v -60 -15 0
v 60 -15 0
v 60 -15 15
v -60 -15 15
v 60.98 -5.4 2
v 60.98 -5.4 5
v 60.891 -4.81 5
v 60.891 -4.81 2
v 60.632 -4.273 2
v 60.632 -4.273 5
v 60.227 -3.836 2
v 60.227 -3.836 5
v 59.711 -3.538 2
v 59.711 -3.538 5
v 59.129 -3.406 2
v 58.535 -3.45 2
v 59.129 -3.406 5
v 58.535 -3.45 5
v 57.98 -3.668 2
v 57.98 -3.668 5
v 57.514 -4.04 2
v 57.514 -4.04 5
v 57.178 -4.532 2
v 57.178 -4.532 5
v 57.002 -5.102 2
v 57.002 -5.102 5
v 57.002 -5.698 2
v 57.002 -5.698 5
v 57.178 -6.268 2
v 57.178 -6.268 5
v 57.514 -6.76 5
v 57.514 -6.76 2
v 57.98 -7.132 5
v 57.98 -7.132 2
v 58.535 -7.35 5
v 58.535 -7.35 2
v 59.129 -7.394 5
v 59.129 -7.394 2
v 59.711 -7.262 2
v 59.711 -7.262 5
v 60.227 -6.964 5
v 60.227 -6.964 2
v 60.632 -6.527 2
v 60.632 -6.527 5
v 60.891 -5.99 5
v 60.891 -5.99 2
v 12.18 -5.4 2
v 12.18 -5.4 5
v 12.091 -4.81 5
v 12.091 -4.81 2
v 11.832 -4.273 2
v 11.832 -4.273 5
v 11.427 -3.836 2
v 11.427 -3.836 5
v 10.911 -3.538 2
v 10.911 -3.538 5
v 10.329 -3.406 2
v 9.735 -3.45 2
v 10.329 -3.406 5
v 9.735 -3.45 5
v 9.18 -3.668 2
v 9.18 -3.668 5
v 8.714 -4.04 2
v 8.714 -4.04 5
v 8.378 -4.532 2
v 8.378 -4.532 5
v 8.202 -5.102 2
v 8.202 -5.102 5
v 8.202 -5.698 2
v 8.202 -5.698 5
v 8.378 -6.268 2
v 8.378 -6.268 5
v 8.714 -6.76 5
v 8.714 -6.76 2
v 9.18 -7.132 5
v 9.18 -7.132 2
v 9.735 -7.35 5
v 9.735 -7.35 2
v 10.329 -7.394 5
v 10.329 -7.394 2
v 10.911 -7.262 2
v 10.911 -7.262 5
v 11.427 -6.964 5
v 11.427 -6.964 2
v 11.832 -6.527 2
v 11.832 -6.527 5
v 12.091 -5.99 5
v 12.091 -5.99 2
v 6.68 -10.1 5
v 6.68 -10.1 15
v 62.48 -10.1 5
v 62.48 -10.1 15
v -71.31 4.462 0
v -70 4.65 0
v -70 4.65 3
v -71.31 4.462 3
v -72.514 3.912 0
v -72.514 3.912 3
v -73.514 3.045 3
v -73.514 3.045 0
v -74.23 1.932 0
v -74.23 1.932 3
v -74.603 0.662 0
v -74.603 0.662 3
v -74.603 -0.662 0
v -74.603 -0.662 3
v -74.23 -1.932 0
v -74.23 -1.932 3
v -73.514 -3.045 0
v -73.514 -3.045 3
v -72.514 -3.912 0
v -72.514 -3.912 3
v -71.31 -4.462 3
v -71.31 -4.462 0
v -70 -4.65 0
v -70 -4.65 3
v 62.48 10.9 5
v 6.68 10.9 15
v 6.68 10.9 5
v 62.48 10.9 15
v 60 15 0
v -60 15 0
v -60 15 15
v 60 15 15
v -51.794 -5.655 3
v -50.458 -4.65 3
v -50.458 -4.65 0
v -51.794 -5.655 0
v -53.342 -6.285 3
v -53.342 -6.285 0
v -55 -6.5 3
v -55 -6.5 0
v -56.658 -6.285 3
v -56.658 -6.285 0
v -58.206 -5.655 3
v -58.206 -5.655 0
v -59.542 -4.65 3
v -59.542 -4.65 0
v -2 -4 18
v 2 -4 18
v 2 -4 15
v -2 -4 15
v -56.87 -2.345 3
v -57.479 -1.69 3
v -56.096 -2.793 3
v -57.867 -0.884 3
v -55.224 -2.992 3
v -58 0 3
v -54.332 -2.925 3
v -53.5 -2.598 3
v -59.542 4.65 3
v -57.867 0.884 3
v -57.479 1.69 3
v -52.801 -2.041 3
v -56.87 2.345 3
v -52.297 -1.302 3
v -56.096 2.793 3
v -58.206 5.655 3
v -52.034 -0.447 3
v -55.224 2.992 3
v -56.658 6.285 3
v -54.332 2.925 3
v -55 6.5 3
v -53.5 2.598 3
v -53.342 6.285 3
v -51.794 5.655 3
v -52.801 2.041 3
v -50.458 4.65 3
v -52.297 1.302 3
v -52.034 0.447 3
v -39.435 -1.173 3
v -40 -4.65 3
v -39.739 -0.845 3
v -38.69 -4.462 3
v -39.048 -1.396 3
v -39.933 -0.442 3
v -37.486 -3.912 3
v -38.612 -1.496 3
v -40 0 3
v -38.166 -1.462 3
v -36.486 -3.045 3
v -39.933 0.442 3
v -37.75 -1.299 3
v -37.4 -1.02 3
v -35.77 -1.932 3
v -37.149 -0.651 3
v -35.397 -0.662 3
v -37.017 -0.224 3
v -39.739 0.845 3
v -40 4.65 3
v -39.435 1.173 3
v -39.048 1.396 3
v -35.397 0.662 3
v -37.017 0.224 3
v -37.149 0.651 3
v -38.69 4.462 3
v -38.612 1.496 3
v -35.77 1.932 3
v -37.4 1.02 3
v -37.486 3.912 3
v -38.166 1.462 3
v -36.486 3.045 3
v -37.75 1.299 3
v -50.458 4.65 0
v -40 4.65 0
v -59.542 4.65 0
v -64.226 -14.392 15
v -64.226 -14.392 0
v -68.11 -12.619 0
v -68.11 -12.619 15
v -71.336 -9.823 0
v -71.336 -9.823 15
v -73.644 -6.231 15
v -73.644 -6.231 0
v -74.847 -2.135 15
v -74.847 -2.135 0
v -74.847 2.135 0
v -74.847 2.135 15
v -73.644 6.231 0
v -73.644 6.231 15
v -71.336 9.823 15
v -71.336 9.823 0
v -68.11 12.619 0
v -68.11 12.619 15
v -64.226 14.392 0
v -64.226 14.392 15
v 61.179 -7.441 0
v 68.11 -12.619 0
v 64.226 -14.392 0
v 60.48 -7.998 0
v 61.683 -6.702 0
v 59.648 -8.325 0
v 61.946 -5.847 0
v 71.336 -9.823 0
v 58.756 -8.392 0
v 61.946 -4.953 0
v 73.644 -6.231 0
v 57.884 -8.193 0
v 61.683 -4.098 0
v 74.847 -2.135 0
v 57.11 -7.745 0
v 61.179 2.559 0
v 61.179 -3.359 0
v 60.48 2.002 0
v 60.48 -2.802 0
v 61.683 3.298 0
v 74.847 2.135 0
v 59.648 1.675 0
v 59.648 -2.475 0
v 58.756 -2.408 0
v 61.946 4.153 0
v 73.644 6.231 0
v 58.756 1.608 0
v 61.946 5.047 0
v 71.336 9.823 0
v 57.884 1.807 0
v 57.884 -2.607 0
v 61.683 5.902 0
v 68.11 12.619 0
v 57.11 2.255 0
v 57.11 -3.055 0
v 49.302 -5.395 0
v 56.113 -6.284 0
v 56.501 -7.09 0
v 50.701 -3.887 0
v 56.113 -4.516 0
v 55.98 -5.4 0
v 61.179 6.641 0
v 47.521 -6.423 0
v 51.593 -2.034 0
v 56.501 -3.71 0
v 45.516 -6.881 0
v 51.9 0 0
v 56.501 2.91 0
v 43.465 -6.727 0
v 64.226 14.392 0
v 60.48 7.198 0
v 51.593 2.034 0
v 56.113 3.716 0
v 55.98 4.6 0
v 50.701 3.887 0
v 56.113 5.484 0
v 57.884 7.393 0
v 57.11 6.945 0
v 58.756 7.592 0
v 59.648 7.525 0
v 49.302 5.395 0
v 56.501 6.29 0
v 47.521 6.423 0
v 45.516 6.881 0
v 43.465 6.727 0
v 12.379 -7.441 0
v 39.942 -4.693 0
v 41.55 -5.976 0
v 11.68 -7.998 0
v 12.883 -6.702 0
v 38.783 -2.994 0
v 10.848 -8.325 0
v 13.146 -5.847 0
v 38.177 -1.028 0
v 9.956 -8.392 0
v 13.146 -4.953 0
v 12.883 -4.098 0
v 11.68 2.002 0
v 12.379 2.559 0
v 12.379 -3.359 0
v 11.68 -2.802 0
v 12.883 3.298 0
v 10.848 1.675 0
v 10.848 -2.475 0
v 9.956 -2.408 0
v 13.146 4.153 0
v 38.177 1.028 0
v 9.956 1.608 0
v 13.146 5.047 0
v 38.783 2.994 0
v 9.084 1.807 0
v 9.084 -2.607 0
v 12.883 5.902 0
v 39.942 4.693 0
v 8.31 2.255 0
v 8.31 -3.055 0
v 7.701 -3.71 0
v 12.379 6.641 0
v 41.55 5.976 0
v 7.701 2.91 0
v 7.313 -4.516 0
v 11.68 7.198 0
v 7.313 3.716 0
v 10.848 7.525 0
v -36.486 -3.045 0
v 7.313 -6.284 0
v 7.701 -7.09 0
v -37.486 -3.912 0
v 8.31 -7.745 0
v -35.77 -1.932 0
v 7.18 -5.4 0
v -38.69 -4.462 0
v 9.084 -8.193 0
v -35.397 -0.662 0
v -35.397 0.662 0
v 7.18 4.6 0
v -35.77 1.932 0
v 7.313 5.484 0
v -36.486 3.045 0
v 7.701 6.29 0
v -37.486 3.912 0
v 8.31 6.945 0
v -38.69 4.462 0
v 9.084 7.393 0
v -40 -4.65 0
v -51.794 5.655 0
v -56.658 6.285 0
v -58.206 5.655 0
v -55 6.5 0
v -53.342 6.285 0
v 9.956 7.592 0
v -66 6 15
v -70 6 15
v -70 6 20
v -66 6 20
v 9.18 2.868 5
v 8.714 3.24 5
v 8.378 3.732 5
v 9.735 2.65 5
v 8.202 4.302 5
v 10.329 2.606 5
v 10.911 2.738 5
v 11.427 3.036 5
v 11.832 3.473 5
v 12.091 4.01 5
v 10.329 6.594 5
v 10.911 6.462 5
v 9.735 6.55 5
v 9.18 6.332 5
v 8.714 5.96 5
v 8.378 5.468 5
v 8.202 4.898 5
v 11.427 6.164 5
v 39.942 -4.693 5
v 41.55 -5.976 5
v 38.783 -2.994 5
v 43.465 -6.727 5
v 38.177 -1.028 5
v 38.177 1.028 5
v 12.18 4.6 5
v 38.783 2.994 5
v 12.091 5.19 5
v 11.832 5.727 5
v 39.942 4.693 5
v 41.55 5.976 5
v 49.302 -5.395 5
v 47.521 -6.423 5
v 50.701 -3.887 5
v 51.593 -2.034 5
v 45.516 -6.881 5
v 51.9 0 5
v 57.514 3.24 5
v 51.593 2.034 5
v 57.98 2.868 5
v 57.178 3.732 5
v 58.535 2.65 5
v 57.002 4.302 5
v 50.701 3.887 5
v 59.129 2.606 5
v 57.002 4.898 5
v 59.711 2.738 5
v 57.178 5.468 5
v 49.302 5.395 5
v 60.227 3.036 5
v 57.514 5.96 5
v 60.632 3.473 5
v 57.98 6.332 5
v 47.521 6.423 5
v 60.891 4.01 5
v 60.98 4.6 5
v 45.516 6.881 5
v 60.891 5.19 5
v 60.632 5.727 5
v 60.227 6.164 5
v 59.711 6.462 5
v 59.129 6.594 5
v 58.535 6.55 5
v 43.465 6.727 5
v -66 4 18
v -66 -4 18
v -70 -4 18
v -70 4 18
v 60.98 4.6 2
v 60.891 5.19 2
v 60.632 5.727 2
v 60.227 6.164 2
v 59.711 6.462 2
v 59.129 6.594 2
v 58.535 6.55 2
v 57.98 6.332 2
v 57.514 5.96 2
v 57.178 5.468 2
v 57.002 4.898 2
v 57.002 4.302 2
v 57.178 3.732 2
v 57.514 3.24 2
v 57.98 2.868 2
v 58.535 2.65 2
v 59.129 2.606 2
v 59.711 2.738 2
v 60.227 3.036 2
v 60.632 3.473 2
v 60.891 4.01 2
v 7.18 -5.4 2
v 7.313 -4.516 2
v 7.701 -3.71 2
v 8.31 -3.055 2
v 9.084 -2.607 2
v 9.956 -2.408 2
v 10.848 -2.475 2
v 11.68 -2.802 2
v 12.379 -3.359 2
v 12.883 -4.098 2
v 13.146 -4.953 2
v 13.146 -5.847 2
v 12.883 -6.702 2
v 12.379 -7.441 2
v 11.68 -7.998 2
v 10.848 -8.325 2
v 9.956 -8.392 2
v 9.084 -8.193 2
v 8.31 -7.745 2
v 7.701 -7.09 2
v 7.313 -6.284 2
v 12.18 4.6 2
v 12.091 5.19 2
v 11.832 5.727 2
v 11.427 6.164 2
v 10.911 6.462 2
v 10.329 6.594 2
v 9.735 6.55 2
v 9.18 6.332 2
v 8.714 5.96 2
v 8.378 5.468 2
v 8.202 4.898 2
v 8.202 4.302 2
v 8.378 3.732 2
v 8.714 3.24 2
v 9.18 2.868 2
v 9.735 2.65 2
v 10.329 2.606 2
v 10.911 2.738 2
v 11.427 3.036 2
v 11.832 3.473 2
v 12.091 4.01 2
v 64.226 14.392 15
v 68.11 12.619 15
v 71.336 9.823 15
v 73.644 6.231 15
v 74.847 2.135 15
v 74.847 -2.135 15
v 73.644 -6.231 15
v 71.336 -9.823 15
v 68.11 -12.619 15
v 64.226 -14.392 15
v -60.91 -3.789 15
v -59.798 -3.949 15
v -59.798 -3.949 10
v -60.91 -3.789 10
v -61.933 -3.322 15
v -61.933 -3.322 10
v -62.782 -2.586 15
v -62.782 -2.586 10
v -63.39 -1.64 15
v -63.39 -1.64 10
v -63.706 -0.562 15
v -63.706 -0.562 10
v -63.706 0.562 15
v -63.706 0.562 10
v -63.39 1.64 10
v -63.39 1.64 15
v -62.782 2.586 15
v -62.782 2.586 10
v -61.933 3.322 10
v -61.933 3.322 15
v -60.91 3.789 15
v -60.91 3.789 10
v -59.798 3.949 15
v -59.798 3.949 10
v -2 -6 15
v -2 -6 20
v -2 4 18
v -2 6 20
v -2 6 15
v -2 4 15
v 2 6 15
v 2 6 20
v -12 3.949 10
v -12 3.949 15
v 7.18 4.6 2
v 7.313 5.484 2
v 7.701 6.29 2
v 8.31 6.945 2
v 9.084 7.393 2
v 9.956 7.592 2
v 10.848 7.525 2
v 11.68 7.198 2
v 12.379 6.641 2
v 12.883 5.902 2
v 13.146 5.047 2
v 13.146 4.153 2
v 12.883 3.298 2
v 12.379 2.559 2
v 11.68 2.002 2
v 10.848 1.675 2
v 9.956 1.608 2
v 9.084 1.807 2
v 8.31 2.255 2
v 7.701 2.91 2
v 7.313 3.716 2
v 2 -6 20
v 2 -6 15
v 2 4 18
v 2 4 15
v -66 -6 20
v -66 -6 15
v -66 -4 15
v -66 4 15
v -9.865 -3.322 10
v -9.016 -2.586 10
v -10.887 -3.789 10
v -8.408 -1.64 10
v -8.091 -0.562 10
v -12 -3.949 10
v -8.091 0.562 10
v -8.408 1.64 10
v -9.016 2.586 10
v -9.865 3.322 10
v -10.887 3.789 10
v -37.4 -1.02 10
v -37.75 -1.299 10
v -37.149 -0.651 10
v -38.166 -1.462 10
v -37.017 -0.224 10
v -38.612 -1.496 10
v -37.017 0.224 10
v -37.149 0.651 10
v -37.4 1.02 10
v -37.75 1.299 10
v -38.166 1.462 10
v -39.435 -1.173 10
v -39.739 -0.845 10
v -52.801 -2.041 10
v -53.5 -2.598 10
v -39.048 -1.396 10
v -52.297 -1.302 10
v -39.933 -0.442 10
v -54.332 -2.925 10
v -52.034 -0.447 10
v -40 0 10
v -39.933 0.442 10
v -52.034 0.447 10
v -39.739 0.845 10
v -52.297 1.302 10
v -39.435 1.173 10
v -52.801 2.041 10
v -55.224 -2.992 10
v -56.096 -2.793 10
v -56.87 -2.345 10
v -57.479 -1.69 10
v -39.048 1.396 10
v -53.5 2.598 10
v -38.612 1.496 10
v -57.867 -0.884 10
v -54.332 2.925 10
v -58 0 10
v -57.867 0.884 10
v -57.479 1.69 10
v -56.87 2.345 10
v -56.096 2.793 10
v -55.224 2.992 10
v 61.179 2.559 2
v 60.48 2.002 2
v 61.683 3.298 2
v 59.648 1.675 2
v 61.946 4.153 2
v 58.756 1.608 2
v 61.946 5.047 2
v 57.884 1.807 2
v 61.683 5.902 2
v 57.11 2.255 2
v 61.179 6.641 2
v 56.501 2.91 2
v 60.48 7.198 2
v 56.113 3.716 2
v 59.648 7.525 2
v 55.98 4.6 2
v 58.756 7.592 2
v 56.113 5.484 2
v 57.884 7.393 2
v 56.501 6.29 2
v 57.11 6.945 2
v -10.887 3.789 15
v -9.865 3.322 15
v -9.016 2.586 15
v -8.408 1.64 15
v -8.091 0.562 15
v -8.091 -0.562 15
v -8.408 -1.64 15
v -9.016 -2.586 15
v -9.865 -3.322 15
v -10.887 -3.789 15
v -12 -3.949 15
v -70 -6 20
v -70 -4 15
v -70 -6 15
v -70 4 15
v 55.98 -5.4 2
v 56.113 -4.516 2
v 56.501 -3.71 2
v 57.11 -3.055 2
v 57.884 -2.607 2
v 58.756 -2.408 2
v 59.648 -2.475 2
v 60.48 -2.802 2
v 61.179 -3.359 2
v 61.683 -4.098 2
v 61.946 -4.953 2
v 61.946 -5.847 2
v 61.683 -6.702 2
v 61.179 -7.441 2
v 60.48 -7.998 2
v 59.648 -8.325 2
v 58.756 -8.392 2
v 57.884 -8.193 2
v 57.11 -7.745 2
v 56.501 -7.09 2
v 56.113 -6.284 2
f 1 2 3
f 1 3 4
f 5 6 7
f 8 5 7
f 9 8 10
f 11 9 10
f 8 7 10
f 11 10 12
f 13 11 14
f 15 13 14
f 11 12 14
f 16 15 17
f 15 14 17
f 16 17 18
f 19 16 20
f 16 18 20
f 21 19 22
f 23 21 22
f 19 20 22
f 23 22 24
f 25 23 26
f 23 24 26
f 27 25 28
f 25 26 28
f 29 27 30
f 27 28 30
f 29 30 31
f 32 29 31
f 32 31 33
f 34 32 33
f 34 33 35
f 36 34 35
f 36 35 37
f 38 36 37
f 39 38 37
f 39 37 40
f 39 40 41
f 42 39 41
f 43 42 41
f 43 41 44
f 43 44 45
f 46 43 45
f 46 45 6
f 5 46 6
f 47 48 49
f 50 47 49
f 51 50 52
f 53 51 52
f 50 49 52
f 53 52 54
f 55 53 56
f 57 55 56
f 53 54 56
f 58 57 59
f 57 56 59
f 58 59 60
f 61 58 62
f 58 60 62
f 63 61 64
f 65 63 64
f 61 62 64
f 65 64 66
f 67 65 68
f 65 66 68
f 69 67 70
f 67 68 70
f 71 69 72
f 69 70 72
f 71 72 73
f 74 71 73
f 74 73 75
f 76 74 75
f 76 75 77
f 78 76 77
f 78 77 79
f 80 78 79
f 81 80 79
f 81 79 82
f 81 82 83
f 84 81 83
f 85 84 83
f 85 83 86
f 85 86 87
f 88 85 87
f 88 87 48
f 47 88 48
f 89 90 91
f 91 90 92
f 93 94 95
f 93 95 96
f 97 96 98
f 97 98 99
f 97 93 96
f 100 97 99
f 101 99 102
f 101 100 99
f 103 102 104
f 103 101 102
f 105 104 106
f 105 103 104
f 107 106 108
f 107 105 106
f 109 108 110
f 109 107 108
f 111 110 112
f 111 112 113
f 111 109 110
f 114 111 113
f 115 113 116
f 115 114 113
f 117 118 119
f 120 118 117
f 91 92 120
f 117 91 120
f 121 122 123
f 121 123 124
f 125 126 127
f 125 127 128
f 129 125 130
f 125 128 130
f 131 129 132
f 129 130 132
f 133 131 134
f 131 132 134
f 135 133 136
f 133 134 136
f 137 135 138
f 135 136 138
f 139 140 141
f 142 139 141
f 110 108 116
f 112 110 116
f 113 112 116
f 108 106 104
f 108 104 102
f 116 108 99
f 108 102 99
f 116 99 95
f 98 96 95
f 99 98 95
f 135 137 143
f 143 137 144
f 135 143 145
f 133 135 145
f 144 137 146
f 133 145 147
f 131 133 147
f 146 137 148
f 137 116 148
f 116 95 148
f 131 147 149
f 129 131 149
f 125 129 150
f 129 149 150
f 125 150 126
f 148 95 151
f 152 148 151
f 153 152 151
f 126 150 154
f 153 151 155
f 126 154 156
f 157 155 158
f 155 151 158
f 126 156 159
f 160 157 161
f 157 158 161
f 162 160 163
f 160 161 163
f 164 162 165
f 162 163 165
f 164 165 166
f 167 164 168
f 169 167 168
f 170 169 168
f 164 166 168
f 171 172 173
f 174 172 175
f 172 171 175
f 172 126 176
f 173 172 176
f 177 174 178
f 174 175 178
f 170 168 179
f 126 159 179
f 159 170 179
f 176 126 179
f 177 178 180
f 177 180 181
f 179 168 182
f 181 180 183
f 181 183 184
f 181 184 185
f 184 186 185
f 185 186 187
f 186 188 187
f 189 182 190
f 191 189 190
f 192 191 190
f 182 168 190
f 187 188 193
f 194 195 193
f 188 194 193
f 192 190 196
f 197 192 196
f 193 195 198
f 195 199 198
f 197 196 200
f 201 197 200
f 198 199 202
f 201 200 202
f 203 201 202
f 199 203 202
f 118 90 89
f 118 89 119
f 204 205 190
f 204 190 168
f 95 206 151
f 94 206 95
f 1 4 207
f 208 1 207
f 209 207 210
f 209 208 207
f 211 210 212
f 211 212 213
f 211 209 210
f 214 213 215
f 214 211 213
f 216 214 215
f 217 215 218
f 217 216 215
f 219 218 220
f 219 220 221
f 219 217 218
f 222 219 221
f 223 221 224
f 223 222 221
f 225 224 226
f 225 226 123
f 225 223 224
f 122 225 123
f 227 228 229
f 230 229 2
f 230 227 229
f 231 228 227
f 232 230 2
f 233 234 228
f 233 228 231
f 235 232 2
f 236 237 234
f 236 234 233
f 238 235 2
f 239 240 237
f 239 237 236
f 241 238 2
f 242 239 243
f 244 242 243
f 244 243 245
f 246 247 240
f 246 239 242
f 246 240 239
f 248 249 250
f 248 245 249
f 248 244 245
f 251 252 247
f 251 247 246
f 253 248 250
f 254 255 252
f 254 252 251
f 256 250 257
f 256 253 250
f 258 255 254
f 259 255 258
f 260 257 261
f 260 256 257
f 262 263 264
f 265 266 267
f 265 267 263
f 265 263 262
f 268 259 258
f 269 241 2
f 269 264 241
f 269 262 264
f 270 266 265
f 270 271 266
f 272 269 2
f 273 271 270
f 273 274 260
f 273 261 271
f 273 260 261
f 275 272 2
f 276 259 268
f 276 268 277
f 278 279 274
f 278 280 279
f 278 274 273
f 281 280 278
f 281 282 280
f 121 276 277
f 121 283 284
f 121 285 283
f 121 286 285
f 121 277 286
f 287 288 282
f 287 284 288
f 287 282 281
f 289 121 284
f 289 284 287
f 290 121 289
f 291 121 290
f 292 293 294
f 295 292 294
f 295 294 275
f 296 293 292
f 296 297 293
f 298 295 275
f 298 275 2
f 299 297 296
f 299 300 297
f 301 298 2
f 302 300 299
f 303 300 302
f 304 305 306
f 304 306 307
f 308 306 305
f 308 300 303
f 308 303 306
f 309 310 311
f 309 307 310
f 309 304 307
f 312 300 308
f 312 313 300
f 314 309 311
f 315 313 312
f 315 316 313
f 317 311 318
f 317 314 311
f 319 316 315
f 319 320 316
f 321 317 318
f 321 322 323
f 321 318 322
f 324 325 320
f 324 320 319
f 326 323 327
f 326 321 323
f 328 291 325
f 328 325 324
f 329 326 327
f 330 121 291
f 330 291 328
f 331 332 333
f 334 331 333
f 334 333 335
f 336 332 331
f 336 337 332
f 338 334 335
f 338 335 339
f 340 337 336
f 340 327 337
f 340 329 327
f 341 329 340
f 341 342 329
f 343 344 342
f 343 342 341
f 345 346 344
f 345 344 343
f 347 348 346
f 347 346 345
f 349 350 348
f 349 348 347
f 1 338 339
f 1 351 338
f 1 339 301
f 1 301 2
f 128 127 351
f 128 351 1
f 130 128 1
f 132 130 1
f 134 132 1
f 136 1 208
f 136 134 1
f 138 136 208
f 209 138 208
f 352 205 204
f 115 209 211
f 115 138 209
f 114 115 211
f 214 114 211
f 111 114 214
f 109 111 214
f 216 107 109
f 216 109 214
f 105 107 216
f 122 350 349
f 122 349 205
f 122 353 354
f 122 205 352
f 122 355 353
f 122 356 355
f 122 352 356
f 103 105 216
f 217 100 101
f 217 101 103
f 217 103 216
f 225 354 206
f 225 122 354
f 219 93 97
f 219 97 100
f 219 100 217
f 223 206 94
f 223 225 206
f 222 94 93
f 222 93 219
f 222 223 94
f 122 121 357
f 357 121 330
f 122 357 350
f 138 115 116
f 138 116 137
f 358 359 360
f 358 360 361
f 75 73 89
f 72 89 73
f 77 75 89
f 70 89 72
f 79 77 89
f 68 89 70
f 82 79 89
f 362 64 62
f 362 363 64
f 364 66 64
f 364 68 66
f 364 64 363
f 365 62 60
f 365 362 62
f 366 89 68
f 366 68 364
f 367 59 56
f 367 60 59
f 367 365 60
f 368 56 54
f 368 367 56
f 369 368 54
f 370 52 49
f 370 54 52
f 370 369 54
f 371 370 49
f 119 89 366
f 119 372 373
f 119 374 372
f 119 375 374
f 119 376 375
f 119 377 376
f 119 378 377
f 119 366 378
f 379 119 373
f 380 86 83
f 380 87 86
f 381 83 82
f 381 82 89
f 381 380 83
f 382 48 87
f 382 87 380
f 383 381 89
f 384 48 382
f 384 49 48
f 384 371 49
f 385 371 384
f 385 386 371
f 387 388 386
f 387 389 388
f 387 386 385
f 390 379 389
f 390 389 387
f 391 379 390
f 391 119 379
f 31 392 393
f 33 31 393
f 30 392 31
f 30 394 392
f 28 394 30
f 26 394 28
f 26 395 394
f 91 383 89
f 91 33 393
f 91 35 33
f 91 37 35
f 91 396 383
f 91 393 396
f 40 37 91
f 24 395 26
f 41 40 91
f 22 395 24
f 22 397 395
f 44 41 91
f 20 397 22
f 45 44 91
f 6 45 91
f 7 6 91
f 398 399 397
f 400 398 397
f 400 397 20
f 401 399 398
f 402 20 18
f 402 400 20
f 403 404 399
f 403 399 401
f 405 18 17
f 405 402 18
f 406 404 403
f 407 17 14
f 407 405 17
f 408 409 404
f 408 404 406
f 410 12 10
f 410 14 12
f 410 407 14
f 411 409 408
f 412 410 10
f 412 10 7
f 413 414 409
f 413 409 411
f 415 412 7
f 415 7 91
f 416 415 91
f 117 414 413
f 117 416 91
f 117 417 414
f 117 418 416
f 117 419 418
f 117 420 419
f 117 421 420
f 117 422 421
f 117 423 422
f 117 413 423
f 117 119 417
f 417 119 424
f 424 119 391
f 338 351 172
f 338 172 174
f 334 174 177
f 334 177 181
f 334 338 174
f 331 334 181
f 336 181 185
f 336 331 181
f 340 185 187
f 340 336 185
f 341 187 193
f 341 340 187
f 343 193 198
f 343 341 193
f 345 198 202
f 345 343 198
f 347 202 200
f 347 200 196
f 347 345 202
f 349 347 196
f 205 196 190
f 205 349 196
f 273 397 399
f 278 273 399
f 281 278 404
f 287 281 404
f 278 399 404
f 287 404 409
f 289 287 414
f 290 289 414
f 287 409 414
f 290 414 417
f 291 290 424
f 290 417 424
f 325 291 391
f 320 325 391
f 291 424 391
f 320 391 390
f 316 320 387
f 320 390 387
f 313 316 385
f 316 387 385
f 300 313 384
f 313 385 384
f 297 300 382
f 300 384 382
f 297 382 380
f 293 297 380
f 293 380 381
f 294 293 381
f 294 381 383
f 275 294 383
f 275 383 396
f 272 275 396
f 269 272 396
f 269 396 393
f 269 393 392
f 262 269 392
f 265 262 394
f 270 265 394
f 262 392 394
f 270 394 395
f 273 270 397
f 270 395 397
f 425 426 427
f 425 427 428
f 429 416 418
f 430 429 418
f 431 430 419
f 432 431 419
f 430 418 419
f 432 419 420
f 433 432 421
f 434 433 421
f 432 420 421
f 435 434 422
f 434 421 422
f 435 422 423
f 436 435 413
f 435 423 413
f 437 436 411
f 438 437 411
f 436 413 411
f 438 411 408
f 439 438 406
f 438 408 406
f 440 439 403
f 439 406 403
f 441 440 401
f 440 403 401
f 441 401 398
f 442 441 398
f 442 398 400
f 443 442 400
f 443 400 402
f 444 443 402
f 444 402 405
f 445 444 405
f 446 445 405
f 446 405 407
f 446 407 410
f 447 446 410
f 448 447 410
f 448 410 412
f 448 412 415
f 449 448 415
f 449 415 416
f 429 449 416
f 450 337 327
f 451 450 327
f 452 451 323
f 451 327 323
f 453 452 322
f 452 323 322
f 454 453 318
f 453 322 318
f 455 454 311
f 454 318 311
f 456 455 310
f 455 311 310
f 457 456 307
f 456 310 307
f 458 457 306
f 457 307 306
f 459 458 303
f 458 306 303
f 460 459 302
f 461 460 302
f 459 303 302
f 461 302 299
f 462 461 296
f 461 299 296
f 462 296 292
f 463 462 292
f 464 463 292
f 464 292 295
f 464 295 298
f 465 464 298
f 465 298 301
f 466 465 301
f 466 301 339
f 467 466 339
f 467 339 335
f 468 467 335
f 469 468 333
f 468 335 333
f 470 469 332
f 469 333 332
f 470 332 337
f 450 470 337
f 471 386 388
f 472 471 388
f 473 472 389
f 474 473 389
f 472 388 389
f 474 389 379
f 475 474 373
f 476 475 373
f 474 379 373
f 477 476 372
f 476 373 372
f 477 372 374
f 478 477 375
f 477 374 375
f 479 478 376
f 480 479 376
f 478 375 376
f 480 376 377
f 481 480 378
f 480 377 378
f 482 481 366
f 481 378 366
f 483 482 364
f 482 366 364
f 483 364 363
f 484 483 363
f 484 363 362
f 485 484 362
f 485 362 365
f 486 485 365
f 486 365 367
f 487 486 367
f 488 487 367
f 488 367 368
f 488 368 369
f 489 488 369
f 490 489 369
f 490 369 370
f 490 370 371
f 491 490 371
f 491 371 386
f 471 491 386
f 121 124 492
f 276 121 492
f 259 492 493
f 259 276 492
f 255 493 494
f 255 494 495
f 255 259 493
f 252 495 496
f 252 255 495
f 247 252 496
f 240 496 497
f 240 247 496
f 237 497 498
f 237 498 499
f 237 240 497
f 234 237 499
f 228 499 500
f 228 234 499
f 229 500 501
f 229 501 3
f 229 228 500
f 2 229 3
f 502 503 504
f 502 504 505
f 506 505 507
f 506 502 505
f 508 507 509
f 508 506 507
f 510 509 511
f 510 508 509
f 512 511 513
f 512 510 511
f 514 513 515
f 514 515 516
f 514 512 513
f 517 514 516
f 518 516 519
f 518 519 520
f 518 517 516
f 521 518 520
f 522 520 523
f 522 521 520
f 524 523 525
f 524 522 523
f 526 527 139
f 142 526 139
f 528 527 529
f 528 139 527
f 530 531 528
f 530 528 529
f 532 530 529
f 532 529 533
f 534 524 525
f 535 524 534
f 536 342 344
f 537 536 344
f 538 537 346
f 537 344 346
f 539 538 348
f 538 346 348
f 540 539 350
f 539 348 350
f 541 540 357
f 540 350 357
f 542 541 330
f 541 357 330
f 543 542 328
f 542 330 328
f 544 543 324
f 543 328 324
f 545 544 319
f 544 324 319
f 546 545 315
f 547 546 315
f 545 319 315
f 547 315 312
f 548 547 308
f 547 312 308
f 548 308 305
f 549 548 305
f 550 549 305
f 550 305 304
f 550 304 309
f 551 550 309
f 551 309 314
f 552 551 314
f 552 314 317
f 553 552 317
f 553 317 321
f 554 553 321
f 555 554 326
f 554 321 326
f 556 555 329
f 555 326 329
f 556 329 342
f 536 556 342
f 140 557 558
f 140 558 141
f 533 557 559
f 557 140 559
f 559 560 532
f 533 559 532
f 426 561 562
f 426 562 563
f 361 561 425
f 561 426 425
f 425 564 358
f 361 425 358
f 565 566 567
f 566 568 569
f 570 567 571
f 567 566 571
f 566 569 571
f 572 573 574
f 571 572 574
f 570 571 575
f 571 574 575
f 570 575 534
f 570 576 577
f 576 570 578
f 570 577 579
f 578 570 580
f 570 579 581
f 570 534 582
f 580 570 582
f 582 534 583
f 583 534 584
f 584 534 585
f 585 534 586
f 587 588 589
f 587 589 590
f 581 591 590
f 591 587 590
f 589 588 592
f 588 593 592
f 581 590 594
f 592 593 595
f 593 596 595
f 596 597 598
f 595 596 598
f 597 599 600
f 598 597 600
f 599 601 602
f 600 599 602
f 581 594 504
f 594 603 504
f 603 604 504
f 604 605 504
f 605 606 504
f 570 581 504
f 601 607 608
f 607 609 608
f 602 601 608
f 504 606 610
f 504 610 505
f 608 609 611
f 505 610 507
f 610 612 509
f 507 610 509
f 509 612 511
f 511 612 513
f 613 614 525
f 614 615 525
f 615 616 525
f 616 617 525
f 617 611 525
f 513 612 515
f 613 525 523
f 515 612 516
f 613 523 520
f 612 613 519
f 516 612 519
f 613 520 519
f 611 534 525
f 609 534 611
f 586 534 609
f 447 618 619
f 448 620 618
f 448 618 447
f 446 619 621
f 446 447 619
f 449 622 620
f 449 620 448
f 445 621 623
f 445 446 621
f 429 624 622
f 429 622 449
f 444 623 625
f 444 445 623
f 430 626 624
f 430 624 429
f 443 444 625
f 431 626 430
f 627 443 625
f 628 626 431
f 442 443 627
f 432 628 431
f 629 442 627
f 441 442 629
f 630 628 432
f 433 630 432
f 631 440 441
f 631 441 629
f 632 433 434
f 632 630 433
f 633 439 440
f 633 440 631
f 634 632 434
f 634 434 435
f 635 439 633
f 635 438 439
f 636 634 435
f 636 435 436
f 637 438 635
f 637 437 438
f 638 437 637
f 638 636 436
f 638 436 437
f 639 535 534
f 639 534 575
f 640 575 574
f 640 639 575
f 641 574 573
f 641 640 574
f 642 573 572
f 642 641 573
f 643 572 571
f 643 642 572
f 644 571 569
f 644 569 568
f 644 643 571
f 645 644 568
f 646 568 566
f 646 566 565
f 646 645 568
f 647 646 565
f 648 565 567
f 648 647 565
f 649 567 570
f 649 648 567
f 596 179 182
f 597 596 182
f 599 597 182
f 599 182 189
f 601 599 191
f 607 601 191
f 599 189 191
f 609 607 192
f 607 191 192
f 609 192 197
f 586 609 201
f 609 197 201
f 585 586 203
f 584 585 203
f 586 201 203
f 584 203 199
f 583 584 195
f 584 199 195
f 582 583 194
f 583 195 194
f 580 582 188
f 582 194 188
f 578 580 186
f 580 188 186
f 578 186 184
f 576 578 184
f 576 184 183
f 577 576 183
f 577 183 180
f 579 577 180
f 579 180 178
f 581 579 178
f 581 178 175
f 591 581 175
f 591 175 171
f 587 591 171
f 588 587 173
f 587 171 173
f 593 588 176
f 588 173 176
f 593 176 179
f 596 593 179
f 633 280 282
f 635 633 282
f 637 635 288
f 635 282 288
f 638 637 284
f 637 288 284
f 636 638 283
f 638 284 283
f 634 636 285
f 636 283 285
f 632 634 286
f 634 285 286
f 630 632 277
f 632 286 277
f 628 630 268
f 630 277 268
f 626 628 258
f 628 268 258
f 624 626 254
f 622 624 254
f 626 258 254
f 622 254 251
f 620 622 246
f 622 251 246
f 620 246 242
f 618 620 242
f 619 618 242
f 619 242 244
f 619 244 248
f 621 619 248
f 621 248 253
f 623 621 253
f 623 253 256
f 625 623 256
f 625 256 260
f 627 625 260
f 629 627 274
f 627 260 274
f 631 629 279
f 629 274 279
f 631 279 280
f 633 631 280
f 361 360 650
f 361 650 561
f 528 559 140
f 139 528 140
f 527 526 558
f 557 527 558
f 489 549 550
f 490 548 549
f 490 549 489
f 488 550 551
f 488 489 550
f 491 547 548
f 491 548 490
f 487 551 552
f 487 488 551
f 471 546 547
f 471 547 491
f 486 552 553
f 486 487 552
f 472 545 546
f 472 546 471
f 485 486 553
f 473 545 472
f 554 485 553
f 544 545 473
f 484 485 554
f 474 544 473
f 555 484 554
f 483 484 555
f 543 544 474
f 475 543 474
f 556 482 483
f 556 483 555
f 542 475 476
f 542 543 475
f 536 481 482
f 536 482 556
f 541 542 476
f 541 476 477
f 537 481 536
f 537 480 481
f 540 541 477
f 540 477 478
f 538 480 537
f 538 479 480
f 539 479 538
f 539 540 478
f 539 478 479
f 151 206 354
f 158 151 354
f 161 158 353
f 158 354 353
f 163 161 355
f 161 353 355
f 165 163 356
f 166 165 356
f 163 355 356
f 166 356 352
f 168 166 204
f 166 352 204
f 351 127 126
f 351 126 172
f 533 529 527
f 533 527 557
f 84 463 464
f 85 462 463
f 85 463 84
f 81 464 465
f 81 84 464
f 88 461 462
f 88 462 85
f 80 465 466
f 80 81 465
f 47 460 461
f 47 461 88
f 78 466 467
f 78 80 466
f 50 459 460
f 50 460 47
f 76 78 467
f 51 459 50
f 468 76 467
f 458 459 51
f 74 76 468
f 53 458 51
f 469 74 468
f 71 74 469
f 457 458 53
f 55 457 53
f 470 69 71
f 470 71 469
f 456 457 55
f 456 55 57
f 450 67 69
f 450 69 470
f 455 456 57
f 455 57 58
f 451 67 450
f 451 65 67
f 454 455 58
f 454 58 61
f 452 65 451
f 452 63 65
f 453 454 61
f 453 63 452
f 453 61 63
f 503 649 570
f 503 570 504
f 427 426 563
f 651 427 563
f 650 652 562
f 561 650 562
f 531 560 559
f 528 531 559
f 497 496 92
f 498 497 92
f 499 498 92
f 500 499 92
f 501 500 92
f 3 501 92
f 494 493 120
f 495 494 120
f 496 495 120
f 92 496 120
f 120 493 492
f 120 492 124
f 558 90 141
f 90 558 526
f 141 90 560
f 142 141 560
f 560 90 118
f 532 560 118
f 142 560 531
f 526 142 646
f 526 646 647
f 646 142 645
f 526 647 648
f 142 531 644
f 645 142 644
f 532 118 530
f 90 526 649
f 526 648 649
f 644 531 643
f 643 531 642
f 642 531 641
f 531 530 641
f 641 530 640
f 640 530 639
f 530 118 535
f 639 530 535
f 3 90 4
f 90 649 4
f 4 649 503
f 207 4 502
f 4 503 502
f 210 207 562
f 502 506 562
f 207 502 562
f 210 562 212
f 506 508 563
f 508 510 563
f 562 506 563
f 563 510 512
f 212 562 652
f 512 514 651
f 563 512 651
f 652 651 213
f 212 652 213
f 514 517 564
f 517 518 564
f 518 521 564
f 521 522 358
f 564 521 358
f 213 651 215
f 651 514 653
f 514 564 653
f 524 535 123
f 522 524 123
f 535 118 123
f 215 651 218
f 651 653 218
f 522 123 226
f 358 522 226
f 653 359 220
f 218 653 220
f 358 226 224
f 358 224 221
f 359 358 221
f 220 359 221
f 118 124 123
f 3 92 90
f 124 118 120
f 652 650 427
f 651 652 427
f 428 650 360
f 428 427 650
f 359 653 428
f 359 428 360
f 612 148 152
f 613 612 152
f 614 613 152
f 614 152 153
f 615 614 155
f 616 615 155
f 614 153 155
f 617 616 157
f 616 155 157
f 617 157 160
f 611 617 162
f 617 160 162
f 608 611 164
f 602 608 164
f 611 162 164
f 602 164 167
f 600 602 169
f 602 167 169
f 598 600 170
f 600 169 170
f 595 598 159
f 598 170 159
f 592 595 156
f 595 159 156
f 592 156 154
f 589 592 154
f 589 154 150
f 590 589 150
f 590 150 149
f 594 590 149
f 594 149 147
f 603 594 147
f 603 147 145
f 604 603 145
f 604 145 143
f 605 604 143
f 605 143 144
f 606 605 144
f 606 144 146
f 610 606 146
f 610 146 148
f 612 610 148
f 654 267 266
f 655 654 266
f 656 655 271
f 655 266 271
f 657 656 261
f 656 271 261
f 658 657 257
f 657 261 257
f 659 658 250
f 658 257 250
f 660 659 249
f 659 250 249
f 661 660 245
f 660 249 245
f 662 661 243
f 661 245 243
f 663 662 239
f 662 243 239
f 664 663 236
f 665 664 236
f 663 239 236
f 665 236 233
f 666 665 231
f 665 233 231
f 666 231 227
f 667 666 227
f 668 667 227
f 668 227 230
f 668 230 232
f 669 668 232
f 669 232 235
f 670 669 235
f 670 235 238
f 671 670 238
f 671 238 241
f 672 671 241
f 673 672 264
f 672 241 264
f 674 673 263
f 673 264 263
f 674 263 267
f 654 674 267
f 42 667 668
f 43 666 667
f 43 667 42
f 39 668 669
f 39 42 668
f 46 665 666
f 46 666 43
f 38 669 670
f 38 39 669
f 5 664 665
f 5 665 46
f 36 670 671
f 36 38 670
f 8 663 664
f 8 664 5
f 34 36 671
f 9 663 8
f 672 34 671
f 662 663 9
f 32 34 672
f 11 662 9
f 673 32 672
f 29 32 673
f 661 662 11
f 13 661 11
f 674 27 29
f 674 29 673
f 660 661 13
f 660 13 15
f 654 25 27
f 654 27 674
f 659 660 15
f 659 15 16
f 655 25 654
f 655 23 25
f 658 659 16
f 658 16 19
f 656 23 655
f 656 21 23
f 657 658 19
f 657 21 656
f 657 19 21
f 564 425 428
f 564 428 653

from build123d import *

# Parameters (mm, degrees)
BOSS_EXTRUDE1_DEPTH = 15
SKETCH2_R           = 3
CUT_EXTRUDE1_DEPTH  = 10
SKETCH3_W           = 55.8
SKETCH3_H           = 21
CUT_EXTRUDE2_DEPTH  = 10
SKETCH4_R           = 6.9
SKETCH4_R_2         = 2
CUT_EXTRUDE3_DEPTH  = 5
CUT_EXTRUDE4_DEPTH  = 5
SKETCH7_R           = 3
CUT_EXTRUDE5_DEPTH  = 2
CUT_EXTRUDE6_DEPTH  = 3
SKETCH9_R           = 6.5
CUT_EXTRUDE7_DEPTH  = 3
SKETCH11_W          = 4
SKETCH11_H          = 12
BOSS_EXTRUDE2_DEPTH = 5
CUT_EXTRUDE9_DEPTH  = 4
SKETCH14_W          = 4
SKETCH14_H          = 12
BOSS_EXTRUDE3_DEPTH = 5
SKETCH15_W          = 3
SKETCH15_H          = 8
CUT_EXTRUDE10_DEPTH = 4
SKETCH16_R          = 1.5
CUT_EXTRUDE11_DEPTH = 7


with BuildPart() as part:
    # Sketch1 → Boss-Extrude1 (new body)
    with BuildSketch(Plane.XY):
        with BuildLine():
            Line((60, -15), (-60, -15))
            ThreePointArc((-60, -15), (-75, 0), (-60, 15))
            Line((-60, 15), (60, 15))
            ThreePointArc((60, 15), (75, 0), (60, -15))
        make_face()
    extrude(amount=BOSS_EXTRUDE1_DEPTH)

    # Sketch2 → Cut-Extrude1 (cut)
    with BuildSketch(Plane(origin=(0, 0, 0), x_dir=(-1, 0, 0), z_dir=(0, 0, -1))):
        with Locations((55, 0)):
            Circle(SKETCH2_R)
    extrude(amount=-CUT_EXTRUDE1_DEPTH, mode=Mode.SUBTRACT)

    # Sketch3 → Cut-Extrude2 (cut)
    with BuildSketch(Plane.XY.offset(15)):
        with Locations((34.58, 0.4)):
            Rectangle(SKETCH3_W, SKETCH3_H)
    extrude(amount=-CUT_EXTRUDE2_DEPTH, mode=Mode.SUBTRACT)

    # Sketch4 → Cut-Extrude3 (cut)
    with BuildSketch(Plane.XY.offset(5)):
        with Locations((45, 0)):
            Circle(SKETCH4_R)
        with Locations((58.98, -5.4)):
            Circle(SKETCH4_R_2)
        with Locations((58.98, 4.6)):
            Circle(SKETCH4_R_2)
        with Locations((10.18, 4.6)):
            Circle(SKETCH4_R_2)
        with Locations((10.18, -5.4)):
            Circle(SKETCH4_R_2)
    extrude(amount=-CUT_EXTRUDE3_DEPTH, mode=Mode.SUBTRACT)

    # Sketch6 → Cut-Extrude4 (cut)
    with BuildSketch(Plane.XY.offset(15)):
        with BuildLine():
            Line((-59.79767324, 3.94890295), (-12, 3.94890295))
            ThreePointArc((-12, 3.94890295), (-8.05109705, 0), (-12, -3.94890295))
            Line((-12, -3.94890295), (-59.79767324, -3.94890295))
            ThreePointArc((-59.79767324, -3.94890295), (-63.74657619, 0), (-59.79767324, 3.94890295))
        make_face()
    extrude(amount=-CUT_EXTRUDE4_DEPTH, mode=Mode.SUBTRACT)

    # Sketch7 → Cut-Extrude5 (cut)
    with BuildSketch(Plane(origin=(0, 0, 0), x_dir=(-1, 0, 0), z_dir=(0, 0, -1))):
        with Locations((-58.98, 4.6)):
            Circle(SKETCH7_R)
        with Locations((-58.98, -5.4)):
            Circle(SKETCH7_R)
        with Locations((-10.18, 4.6)):
            Circle(SKETCH7_R)
        with Locations((-10.18, -5.4)):
            Circle(SKETCH7_R)
    extrude(amount=-CUT_EXTRUDE5_DEPTH, mode=Mode.SUBTRACT)

    # Sketch8 → Cut-Extrude6 (cut)
    with BuildSketch(Plane(origin=(0, 0, 0), x_dir=(-1, 0, 0), z_dir=(0, 0, -1))):
        with BuildLine():
            Line((40, 4.65), (70, 4.65))
            ThreePointArc((70, 4.65), (74.65, 0), (70, -4.65))
            Line((70, -4.65), (40, -4.65))
            ThreePointArc((40, -4.65), (35.35, 0), (40, 4.65))
        make_face()
    extrude(amount=-CUT_EXTRUDE6_DEPTH, mode=Mode.SUBTRACT)

    # Sketch9 → Cut-Extrude7 (cut)
    with BuildSketch(Plane(origin=(0, 0, 0), x_dir=(-1, 0, 0), z_dir=(0, 0, -1))):
        with Locations((55, 0)):
            Circle(SKETCH9_R)
    extrude(amount=-CUT_EXTRUDE7_DEPTH, mode=Mode.SUBTRACT)

    # Sketch11 → Boss-Extrude2 (add)
    with BuildSketch(Plane.XY.offset(15)):
        Rectangle(SKETCH11_W, SKETCH11_H)
    extrude(amount=BOSS_EXTRUDE2_DEPTH)

    # Sketch13 → Cut-Extrude9 (cut)
    with BuildSketch(Plane(origin=(2, 0, 0), x_dir=(0, 0, -1), z_dir=(1, 0, 0))):
        Polygon((-15, 0), (-15, 4), (-18, 4), (-18, -4), (-15, -4), align=None)
    extrude(amount=-CUT_EXTRUDE9_DEPTH, mode=Mode.SUBTRACT)

    # Sketch14 → Boss-Extrude3 (add)
    with BuildSketch(Plane.XY.offset(15)):
        with Locations((-68, 0)):
            Rectangle(SKETCH14_W, SKETCH14_H)
    extrude(amount=BOSS_EXTRUDE3_DEPTH)

    # Sketch15 → Cut-Extrude10 (cut)
    with BuildSketch(Plane(origin=(-66, 0, 0), x_dir=(0, 0, -1), z_dir=(1, 0, 0))):
        with Locations((-16.5, 0)):
            Rectangle(SKETCH15_W, SKETCH15_H)
    extrude(amount=-CUT_EXTRUDE10_DEPTH, mode=Mode.SUBTRACT)

    # Sketch16 → Cut-Extrude11 (cut)
    with BuildSketch(Plane(origin=(0, 0, 3), x_dir=(-1, 0, 0), z_dir=(0, 0, -1))):
        with Locations((38.5, 0)):
            Circle(SKETCH16_R)
    extrude(amount=-CUT_EXTRUDE11_DEPTH, mode=Mode.SUBTRACT)


solid = part.part
